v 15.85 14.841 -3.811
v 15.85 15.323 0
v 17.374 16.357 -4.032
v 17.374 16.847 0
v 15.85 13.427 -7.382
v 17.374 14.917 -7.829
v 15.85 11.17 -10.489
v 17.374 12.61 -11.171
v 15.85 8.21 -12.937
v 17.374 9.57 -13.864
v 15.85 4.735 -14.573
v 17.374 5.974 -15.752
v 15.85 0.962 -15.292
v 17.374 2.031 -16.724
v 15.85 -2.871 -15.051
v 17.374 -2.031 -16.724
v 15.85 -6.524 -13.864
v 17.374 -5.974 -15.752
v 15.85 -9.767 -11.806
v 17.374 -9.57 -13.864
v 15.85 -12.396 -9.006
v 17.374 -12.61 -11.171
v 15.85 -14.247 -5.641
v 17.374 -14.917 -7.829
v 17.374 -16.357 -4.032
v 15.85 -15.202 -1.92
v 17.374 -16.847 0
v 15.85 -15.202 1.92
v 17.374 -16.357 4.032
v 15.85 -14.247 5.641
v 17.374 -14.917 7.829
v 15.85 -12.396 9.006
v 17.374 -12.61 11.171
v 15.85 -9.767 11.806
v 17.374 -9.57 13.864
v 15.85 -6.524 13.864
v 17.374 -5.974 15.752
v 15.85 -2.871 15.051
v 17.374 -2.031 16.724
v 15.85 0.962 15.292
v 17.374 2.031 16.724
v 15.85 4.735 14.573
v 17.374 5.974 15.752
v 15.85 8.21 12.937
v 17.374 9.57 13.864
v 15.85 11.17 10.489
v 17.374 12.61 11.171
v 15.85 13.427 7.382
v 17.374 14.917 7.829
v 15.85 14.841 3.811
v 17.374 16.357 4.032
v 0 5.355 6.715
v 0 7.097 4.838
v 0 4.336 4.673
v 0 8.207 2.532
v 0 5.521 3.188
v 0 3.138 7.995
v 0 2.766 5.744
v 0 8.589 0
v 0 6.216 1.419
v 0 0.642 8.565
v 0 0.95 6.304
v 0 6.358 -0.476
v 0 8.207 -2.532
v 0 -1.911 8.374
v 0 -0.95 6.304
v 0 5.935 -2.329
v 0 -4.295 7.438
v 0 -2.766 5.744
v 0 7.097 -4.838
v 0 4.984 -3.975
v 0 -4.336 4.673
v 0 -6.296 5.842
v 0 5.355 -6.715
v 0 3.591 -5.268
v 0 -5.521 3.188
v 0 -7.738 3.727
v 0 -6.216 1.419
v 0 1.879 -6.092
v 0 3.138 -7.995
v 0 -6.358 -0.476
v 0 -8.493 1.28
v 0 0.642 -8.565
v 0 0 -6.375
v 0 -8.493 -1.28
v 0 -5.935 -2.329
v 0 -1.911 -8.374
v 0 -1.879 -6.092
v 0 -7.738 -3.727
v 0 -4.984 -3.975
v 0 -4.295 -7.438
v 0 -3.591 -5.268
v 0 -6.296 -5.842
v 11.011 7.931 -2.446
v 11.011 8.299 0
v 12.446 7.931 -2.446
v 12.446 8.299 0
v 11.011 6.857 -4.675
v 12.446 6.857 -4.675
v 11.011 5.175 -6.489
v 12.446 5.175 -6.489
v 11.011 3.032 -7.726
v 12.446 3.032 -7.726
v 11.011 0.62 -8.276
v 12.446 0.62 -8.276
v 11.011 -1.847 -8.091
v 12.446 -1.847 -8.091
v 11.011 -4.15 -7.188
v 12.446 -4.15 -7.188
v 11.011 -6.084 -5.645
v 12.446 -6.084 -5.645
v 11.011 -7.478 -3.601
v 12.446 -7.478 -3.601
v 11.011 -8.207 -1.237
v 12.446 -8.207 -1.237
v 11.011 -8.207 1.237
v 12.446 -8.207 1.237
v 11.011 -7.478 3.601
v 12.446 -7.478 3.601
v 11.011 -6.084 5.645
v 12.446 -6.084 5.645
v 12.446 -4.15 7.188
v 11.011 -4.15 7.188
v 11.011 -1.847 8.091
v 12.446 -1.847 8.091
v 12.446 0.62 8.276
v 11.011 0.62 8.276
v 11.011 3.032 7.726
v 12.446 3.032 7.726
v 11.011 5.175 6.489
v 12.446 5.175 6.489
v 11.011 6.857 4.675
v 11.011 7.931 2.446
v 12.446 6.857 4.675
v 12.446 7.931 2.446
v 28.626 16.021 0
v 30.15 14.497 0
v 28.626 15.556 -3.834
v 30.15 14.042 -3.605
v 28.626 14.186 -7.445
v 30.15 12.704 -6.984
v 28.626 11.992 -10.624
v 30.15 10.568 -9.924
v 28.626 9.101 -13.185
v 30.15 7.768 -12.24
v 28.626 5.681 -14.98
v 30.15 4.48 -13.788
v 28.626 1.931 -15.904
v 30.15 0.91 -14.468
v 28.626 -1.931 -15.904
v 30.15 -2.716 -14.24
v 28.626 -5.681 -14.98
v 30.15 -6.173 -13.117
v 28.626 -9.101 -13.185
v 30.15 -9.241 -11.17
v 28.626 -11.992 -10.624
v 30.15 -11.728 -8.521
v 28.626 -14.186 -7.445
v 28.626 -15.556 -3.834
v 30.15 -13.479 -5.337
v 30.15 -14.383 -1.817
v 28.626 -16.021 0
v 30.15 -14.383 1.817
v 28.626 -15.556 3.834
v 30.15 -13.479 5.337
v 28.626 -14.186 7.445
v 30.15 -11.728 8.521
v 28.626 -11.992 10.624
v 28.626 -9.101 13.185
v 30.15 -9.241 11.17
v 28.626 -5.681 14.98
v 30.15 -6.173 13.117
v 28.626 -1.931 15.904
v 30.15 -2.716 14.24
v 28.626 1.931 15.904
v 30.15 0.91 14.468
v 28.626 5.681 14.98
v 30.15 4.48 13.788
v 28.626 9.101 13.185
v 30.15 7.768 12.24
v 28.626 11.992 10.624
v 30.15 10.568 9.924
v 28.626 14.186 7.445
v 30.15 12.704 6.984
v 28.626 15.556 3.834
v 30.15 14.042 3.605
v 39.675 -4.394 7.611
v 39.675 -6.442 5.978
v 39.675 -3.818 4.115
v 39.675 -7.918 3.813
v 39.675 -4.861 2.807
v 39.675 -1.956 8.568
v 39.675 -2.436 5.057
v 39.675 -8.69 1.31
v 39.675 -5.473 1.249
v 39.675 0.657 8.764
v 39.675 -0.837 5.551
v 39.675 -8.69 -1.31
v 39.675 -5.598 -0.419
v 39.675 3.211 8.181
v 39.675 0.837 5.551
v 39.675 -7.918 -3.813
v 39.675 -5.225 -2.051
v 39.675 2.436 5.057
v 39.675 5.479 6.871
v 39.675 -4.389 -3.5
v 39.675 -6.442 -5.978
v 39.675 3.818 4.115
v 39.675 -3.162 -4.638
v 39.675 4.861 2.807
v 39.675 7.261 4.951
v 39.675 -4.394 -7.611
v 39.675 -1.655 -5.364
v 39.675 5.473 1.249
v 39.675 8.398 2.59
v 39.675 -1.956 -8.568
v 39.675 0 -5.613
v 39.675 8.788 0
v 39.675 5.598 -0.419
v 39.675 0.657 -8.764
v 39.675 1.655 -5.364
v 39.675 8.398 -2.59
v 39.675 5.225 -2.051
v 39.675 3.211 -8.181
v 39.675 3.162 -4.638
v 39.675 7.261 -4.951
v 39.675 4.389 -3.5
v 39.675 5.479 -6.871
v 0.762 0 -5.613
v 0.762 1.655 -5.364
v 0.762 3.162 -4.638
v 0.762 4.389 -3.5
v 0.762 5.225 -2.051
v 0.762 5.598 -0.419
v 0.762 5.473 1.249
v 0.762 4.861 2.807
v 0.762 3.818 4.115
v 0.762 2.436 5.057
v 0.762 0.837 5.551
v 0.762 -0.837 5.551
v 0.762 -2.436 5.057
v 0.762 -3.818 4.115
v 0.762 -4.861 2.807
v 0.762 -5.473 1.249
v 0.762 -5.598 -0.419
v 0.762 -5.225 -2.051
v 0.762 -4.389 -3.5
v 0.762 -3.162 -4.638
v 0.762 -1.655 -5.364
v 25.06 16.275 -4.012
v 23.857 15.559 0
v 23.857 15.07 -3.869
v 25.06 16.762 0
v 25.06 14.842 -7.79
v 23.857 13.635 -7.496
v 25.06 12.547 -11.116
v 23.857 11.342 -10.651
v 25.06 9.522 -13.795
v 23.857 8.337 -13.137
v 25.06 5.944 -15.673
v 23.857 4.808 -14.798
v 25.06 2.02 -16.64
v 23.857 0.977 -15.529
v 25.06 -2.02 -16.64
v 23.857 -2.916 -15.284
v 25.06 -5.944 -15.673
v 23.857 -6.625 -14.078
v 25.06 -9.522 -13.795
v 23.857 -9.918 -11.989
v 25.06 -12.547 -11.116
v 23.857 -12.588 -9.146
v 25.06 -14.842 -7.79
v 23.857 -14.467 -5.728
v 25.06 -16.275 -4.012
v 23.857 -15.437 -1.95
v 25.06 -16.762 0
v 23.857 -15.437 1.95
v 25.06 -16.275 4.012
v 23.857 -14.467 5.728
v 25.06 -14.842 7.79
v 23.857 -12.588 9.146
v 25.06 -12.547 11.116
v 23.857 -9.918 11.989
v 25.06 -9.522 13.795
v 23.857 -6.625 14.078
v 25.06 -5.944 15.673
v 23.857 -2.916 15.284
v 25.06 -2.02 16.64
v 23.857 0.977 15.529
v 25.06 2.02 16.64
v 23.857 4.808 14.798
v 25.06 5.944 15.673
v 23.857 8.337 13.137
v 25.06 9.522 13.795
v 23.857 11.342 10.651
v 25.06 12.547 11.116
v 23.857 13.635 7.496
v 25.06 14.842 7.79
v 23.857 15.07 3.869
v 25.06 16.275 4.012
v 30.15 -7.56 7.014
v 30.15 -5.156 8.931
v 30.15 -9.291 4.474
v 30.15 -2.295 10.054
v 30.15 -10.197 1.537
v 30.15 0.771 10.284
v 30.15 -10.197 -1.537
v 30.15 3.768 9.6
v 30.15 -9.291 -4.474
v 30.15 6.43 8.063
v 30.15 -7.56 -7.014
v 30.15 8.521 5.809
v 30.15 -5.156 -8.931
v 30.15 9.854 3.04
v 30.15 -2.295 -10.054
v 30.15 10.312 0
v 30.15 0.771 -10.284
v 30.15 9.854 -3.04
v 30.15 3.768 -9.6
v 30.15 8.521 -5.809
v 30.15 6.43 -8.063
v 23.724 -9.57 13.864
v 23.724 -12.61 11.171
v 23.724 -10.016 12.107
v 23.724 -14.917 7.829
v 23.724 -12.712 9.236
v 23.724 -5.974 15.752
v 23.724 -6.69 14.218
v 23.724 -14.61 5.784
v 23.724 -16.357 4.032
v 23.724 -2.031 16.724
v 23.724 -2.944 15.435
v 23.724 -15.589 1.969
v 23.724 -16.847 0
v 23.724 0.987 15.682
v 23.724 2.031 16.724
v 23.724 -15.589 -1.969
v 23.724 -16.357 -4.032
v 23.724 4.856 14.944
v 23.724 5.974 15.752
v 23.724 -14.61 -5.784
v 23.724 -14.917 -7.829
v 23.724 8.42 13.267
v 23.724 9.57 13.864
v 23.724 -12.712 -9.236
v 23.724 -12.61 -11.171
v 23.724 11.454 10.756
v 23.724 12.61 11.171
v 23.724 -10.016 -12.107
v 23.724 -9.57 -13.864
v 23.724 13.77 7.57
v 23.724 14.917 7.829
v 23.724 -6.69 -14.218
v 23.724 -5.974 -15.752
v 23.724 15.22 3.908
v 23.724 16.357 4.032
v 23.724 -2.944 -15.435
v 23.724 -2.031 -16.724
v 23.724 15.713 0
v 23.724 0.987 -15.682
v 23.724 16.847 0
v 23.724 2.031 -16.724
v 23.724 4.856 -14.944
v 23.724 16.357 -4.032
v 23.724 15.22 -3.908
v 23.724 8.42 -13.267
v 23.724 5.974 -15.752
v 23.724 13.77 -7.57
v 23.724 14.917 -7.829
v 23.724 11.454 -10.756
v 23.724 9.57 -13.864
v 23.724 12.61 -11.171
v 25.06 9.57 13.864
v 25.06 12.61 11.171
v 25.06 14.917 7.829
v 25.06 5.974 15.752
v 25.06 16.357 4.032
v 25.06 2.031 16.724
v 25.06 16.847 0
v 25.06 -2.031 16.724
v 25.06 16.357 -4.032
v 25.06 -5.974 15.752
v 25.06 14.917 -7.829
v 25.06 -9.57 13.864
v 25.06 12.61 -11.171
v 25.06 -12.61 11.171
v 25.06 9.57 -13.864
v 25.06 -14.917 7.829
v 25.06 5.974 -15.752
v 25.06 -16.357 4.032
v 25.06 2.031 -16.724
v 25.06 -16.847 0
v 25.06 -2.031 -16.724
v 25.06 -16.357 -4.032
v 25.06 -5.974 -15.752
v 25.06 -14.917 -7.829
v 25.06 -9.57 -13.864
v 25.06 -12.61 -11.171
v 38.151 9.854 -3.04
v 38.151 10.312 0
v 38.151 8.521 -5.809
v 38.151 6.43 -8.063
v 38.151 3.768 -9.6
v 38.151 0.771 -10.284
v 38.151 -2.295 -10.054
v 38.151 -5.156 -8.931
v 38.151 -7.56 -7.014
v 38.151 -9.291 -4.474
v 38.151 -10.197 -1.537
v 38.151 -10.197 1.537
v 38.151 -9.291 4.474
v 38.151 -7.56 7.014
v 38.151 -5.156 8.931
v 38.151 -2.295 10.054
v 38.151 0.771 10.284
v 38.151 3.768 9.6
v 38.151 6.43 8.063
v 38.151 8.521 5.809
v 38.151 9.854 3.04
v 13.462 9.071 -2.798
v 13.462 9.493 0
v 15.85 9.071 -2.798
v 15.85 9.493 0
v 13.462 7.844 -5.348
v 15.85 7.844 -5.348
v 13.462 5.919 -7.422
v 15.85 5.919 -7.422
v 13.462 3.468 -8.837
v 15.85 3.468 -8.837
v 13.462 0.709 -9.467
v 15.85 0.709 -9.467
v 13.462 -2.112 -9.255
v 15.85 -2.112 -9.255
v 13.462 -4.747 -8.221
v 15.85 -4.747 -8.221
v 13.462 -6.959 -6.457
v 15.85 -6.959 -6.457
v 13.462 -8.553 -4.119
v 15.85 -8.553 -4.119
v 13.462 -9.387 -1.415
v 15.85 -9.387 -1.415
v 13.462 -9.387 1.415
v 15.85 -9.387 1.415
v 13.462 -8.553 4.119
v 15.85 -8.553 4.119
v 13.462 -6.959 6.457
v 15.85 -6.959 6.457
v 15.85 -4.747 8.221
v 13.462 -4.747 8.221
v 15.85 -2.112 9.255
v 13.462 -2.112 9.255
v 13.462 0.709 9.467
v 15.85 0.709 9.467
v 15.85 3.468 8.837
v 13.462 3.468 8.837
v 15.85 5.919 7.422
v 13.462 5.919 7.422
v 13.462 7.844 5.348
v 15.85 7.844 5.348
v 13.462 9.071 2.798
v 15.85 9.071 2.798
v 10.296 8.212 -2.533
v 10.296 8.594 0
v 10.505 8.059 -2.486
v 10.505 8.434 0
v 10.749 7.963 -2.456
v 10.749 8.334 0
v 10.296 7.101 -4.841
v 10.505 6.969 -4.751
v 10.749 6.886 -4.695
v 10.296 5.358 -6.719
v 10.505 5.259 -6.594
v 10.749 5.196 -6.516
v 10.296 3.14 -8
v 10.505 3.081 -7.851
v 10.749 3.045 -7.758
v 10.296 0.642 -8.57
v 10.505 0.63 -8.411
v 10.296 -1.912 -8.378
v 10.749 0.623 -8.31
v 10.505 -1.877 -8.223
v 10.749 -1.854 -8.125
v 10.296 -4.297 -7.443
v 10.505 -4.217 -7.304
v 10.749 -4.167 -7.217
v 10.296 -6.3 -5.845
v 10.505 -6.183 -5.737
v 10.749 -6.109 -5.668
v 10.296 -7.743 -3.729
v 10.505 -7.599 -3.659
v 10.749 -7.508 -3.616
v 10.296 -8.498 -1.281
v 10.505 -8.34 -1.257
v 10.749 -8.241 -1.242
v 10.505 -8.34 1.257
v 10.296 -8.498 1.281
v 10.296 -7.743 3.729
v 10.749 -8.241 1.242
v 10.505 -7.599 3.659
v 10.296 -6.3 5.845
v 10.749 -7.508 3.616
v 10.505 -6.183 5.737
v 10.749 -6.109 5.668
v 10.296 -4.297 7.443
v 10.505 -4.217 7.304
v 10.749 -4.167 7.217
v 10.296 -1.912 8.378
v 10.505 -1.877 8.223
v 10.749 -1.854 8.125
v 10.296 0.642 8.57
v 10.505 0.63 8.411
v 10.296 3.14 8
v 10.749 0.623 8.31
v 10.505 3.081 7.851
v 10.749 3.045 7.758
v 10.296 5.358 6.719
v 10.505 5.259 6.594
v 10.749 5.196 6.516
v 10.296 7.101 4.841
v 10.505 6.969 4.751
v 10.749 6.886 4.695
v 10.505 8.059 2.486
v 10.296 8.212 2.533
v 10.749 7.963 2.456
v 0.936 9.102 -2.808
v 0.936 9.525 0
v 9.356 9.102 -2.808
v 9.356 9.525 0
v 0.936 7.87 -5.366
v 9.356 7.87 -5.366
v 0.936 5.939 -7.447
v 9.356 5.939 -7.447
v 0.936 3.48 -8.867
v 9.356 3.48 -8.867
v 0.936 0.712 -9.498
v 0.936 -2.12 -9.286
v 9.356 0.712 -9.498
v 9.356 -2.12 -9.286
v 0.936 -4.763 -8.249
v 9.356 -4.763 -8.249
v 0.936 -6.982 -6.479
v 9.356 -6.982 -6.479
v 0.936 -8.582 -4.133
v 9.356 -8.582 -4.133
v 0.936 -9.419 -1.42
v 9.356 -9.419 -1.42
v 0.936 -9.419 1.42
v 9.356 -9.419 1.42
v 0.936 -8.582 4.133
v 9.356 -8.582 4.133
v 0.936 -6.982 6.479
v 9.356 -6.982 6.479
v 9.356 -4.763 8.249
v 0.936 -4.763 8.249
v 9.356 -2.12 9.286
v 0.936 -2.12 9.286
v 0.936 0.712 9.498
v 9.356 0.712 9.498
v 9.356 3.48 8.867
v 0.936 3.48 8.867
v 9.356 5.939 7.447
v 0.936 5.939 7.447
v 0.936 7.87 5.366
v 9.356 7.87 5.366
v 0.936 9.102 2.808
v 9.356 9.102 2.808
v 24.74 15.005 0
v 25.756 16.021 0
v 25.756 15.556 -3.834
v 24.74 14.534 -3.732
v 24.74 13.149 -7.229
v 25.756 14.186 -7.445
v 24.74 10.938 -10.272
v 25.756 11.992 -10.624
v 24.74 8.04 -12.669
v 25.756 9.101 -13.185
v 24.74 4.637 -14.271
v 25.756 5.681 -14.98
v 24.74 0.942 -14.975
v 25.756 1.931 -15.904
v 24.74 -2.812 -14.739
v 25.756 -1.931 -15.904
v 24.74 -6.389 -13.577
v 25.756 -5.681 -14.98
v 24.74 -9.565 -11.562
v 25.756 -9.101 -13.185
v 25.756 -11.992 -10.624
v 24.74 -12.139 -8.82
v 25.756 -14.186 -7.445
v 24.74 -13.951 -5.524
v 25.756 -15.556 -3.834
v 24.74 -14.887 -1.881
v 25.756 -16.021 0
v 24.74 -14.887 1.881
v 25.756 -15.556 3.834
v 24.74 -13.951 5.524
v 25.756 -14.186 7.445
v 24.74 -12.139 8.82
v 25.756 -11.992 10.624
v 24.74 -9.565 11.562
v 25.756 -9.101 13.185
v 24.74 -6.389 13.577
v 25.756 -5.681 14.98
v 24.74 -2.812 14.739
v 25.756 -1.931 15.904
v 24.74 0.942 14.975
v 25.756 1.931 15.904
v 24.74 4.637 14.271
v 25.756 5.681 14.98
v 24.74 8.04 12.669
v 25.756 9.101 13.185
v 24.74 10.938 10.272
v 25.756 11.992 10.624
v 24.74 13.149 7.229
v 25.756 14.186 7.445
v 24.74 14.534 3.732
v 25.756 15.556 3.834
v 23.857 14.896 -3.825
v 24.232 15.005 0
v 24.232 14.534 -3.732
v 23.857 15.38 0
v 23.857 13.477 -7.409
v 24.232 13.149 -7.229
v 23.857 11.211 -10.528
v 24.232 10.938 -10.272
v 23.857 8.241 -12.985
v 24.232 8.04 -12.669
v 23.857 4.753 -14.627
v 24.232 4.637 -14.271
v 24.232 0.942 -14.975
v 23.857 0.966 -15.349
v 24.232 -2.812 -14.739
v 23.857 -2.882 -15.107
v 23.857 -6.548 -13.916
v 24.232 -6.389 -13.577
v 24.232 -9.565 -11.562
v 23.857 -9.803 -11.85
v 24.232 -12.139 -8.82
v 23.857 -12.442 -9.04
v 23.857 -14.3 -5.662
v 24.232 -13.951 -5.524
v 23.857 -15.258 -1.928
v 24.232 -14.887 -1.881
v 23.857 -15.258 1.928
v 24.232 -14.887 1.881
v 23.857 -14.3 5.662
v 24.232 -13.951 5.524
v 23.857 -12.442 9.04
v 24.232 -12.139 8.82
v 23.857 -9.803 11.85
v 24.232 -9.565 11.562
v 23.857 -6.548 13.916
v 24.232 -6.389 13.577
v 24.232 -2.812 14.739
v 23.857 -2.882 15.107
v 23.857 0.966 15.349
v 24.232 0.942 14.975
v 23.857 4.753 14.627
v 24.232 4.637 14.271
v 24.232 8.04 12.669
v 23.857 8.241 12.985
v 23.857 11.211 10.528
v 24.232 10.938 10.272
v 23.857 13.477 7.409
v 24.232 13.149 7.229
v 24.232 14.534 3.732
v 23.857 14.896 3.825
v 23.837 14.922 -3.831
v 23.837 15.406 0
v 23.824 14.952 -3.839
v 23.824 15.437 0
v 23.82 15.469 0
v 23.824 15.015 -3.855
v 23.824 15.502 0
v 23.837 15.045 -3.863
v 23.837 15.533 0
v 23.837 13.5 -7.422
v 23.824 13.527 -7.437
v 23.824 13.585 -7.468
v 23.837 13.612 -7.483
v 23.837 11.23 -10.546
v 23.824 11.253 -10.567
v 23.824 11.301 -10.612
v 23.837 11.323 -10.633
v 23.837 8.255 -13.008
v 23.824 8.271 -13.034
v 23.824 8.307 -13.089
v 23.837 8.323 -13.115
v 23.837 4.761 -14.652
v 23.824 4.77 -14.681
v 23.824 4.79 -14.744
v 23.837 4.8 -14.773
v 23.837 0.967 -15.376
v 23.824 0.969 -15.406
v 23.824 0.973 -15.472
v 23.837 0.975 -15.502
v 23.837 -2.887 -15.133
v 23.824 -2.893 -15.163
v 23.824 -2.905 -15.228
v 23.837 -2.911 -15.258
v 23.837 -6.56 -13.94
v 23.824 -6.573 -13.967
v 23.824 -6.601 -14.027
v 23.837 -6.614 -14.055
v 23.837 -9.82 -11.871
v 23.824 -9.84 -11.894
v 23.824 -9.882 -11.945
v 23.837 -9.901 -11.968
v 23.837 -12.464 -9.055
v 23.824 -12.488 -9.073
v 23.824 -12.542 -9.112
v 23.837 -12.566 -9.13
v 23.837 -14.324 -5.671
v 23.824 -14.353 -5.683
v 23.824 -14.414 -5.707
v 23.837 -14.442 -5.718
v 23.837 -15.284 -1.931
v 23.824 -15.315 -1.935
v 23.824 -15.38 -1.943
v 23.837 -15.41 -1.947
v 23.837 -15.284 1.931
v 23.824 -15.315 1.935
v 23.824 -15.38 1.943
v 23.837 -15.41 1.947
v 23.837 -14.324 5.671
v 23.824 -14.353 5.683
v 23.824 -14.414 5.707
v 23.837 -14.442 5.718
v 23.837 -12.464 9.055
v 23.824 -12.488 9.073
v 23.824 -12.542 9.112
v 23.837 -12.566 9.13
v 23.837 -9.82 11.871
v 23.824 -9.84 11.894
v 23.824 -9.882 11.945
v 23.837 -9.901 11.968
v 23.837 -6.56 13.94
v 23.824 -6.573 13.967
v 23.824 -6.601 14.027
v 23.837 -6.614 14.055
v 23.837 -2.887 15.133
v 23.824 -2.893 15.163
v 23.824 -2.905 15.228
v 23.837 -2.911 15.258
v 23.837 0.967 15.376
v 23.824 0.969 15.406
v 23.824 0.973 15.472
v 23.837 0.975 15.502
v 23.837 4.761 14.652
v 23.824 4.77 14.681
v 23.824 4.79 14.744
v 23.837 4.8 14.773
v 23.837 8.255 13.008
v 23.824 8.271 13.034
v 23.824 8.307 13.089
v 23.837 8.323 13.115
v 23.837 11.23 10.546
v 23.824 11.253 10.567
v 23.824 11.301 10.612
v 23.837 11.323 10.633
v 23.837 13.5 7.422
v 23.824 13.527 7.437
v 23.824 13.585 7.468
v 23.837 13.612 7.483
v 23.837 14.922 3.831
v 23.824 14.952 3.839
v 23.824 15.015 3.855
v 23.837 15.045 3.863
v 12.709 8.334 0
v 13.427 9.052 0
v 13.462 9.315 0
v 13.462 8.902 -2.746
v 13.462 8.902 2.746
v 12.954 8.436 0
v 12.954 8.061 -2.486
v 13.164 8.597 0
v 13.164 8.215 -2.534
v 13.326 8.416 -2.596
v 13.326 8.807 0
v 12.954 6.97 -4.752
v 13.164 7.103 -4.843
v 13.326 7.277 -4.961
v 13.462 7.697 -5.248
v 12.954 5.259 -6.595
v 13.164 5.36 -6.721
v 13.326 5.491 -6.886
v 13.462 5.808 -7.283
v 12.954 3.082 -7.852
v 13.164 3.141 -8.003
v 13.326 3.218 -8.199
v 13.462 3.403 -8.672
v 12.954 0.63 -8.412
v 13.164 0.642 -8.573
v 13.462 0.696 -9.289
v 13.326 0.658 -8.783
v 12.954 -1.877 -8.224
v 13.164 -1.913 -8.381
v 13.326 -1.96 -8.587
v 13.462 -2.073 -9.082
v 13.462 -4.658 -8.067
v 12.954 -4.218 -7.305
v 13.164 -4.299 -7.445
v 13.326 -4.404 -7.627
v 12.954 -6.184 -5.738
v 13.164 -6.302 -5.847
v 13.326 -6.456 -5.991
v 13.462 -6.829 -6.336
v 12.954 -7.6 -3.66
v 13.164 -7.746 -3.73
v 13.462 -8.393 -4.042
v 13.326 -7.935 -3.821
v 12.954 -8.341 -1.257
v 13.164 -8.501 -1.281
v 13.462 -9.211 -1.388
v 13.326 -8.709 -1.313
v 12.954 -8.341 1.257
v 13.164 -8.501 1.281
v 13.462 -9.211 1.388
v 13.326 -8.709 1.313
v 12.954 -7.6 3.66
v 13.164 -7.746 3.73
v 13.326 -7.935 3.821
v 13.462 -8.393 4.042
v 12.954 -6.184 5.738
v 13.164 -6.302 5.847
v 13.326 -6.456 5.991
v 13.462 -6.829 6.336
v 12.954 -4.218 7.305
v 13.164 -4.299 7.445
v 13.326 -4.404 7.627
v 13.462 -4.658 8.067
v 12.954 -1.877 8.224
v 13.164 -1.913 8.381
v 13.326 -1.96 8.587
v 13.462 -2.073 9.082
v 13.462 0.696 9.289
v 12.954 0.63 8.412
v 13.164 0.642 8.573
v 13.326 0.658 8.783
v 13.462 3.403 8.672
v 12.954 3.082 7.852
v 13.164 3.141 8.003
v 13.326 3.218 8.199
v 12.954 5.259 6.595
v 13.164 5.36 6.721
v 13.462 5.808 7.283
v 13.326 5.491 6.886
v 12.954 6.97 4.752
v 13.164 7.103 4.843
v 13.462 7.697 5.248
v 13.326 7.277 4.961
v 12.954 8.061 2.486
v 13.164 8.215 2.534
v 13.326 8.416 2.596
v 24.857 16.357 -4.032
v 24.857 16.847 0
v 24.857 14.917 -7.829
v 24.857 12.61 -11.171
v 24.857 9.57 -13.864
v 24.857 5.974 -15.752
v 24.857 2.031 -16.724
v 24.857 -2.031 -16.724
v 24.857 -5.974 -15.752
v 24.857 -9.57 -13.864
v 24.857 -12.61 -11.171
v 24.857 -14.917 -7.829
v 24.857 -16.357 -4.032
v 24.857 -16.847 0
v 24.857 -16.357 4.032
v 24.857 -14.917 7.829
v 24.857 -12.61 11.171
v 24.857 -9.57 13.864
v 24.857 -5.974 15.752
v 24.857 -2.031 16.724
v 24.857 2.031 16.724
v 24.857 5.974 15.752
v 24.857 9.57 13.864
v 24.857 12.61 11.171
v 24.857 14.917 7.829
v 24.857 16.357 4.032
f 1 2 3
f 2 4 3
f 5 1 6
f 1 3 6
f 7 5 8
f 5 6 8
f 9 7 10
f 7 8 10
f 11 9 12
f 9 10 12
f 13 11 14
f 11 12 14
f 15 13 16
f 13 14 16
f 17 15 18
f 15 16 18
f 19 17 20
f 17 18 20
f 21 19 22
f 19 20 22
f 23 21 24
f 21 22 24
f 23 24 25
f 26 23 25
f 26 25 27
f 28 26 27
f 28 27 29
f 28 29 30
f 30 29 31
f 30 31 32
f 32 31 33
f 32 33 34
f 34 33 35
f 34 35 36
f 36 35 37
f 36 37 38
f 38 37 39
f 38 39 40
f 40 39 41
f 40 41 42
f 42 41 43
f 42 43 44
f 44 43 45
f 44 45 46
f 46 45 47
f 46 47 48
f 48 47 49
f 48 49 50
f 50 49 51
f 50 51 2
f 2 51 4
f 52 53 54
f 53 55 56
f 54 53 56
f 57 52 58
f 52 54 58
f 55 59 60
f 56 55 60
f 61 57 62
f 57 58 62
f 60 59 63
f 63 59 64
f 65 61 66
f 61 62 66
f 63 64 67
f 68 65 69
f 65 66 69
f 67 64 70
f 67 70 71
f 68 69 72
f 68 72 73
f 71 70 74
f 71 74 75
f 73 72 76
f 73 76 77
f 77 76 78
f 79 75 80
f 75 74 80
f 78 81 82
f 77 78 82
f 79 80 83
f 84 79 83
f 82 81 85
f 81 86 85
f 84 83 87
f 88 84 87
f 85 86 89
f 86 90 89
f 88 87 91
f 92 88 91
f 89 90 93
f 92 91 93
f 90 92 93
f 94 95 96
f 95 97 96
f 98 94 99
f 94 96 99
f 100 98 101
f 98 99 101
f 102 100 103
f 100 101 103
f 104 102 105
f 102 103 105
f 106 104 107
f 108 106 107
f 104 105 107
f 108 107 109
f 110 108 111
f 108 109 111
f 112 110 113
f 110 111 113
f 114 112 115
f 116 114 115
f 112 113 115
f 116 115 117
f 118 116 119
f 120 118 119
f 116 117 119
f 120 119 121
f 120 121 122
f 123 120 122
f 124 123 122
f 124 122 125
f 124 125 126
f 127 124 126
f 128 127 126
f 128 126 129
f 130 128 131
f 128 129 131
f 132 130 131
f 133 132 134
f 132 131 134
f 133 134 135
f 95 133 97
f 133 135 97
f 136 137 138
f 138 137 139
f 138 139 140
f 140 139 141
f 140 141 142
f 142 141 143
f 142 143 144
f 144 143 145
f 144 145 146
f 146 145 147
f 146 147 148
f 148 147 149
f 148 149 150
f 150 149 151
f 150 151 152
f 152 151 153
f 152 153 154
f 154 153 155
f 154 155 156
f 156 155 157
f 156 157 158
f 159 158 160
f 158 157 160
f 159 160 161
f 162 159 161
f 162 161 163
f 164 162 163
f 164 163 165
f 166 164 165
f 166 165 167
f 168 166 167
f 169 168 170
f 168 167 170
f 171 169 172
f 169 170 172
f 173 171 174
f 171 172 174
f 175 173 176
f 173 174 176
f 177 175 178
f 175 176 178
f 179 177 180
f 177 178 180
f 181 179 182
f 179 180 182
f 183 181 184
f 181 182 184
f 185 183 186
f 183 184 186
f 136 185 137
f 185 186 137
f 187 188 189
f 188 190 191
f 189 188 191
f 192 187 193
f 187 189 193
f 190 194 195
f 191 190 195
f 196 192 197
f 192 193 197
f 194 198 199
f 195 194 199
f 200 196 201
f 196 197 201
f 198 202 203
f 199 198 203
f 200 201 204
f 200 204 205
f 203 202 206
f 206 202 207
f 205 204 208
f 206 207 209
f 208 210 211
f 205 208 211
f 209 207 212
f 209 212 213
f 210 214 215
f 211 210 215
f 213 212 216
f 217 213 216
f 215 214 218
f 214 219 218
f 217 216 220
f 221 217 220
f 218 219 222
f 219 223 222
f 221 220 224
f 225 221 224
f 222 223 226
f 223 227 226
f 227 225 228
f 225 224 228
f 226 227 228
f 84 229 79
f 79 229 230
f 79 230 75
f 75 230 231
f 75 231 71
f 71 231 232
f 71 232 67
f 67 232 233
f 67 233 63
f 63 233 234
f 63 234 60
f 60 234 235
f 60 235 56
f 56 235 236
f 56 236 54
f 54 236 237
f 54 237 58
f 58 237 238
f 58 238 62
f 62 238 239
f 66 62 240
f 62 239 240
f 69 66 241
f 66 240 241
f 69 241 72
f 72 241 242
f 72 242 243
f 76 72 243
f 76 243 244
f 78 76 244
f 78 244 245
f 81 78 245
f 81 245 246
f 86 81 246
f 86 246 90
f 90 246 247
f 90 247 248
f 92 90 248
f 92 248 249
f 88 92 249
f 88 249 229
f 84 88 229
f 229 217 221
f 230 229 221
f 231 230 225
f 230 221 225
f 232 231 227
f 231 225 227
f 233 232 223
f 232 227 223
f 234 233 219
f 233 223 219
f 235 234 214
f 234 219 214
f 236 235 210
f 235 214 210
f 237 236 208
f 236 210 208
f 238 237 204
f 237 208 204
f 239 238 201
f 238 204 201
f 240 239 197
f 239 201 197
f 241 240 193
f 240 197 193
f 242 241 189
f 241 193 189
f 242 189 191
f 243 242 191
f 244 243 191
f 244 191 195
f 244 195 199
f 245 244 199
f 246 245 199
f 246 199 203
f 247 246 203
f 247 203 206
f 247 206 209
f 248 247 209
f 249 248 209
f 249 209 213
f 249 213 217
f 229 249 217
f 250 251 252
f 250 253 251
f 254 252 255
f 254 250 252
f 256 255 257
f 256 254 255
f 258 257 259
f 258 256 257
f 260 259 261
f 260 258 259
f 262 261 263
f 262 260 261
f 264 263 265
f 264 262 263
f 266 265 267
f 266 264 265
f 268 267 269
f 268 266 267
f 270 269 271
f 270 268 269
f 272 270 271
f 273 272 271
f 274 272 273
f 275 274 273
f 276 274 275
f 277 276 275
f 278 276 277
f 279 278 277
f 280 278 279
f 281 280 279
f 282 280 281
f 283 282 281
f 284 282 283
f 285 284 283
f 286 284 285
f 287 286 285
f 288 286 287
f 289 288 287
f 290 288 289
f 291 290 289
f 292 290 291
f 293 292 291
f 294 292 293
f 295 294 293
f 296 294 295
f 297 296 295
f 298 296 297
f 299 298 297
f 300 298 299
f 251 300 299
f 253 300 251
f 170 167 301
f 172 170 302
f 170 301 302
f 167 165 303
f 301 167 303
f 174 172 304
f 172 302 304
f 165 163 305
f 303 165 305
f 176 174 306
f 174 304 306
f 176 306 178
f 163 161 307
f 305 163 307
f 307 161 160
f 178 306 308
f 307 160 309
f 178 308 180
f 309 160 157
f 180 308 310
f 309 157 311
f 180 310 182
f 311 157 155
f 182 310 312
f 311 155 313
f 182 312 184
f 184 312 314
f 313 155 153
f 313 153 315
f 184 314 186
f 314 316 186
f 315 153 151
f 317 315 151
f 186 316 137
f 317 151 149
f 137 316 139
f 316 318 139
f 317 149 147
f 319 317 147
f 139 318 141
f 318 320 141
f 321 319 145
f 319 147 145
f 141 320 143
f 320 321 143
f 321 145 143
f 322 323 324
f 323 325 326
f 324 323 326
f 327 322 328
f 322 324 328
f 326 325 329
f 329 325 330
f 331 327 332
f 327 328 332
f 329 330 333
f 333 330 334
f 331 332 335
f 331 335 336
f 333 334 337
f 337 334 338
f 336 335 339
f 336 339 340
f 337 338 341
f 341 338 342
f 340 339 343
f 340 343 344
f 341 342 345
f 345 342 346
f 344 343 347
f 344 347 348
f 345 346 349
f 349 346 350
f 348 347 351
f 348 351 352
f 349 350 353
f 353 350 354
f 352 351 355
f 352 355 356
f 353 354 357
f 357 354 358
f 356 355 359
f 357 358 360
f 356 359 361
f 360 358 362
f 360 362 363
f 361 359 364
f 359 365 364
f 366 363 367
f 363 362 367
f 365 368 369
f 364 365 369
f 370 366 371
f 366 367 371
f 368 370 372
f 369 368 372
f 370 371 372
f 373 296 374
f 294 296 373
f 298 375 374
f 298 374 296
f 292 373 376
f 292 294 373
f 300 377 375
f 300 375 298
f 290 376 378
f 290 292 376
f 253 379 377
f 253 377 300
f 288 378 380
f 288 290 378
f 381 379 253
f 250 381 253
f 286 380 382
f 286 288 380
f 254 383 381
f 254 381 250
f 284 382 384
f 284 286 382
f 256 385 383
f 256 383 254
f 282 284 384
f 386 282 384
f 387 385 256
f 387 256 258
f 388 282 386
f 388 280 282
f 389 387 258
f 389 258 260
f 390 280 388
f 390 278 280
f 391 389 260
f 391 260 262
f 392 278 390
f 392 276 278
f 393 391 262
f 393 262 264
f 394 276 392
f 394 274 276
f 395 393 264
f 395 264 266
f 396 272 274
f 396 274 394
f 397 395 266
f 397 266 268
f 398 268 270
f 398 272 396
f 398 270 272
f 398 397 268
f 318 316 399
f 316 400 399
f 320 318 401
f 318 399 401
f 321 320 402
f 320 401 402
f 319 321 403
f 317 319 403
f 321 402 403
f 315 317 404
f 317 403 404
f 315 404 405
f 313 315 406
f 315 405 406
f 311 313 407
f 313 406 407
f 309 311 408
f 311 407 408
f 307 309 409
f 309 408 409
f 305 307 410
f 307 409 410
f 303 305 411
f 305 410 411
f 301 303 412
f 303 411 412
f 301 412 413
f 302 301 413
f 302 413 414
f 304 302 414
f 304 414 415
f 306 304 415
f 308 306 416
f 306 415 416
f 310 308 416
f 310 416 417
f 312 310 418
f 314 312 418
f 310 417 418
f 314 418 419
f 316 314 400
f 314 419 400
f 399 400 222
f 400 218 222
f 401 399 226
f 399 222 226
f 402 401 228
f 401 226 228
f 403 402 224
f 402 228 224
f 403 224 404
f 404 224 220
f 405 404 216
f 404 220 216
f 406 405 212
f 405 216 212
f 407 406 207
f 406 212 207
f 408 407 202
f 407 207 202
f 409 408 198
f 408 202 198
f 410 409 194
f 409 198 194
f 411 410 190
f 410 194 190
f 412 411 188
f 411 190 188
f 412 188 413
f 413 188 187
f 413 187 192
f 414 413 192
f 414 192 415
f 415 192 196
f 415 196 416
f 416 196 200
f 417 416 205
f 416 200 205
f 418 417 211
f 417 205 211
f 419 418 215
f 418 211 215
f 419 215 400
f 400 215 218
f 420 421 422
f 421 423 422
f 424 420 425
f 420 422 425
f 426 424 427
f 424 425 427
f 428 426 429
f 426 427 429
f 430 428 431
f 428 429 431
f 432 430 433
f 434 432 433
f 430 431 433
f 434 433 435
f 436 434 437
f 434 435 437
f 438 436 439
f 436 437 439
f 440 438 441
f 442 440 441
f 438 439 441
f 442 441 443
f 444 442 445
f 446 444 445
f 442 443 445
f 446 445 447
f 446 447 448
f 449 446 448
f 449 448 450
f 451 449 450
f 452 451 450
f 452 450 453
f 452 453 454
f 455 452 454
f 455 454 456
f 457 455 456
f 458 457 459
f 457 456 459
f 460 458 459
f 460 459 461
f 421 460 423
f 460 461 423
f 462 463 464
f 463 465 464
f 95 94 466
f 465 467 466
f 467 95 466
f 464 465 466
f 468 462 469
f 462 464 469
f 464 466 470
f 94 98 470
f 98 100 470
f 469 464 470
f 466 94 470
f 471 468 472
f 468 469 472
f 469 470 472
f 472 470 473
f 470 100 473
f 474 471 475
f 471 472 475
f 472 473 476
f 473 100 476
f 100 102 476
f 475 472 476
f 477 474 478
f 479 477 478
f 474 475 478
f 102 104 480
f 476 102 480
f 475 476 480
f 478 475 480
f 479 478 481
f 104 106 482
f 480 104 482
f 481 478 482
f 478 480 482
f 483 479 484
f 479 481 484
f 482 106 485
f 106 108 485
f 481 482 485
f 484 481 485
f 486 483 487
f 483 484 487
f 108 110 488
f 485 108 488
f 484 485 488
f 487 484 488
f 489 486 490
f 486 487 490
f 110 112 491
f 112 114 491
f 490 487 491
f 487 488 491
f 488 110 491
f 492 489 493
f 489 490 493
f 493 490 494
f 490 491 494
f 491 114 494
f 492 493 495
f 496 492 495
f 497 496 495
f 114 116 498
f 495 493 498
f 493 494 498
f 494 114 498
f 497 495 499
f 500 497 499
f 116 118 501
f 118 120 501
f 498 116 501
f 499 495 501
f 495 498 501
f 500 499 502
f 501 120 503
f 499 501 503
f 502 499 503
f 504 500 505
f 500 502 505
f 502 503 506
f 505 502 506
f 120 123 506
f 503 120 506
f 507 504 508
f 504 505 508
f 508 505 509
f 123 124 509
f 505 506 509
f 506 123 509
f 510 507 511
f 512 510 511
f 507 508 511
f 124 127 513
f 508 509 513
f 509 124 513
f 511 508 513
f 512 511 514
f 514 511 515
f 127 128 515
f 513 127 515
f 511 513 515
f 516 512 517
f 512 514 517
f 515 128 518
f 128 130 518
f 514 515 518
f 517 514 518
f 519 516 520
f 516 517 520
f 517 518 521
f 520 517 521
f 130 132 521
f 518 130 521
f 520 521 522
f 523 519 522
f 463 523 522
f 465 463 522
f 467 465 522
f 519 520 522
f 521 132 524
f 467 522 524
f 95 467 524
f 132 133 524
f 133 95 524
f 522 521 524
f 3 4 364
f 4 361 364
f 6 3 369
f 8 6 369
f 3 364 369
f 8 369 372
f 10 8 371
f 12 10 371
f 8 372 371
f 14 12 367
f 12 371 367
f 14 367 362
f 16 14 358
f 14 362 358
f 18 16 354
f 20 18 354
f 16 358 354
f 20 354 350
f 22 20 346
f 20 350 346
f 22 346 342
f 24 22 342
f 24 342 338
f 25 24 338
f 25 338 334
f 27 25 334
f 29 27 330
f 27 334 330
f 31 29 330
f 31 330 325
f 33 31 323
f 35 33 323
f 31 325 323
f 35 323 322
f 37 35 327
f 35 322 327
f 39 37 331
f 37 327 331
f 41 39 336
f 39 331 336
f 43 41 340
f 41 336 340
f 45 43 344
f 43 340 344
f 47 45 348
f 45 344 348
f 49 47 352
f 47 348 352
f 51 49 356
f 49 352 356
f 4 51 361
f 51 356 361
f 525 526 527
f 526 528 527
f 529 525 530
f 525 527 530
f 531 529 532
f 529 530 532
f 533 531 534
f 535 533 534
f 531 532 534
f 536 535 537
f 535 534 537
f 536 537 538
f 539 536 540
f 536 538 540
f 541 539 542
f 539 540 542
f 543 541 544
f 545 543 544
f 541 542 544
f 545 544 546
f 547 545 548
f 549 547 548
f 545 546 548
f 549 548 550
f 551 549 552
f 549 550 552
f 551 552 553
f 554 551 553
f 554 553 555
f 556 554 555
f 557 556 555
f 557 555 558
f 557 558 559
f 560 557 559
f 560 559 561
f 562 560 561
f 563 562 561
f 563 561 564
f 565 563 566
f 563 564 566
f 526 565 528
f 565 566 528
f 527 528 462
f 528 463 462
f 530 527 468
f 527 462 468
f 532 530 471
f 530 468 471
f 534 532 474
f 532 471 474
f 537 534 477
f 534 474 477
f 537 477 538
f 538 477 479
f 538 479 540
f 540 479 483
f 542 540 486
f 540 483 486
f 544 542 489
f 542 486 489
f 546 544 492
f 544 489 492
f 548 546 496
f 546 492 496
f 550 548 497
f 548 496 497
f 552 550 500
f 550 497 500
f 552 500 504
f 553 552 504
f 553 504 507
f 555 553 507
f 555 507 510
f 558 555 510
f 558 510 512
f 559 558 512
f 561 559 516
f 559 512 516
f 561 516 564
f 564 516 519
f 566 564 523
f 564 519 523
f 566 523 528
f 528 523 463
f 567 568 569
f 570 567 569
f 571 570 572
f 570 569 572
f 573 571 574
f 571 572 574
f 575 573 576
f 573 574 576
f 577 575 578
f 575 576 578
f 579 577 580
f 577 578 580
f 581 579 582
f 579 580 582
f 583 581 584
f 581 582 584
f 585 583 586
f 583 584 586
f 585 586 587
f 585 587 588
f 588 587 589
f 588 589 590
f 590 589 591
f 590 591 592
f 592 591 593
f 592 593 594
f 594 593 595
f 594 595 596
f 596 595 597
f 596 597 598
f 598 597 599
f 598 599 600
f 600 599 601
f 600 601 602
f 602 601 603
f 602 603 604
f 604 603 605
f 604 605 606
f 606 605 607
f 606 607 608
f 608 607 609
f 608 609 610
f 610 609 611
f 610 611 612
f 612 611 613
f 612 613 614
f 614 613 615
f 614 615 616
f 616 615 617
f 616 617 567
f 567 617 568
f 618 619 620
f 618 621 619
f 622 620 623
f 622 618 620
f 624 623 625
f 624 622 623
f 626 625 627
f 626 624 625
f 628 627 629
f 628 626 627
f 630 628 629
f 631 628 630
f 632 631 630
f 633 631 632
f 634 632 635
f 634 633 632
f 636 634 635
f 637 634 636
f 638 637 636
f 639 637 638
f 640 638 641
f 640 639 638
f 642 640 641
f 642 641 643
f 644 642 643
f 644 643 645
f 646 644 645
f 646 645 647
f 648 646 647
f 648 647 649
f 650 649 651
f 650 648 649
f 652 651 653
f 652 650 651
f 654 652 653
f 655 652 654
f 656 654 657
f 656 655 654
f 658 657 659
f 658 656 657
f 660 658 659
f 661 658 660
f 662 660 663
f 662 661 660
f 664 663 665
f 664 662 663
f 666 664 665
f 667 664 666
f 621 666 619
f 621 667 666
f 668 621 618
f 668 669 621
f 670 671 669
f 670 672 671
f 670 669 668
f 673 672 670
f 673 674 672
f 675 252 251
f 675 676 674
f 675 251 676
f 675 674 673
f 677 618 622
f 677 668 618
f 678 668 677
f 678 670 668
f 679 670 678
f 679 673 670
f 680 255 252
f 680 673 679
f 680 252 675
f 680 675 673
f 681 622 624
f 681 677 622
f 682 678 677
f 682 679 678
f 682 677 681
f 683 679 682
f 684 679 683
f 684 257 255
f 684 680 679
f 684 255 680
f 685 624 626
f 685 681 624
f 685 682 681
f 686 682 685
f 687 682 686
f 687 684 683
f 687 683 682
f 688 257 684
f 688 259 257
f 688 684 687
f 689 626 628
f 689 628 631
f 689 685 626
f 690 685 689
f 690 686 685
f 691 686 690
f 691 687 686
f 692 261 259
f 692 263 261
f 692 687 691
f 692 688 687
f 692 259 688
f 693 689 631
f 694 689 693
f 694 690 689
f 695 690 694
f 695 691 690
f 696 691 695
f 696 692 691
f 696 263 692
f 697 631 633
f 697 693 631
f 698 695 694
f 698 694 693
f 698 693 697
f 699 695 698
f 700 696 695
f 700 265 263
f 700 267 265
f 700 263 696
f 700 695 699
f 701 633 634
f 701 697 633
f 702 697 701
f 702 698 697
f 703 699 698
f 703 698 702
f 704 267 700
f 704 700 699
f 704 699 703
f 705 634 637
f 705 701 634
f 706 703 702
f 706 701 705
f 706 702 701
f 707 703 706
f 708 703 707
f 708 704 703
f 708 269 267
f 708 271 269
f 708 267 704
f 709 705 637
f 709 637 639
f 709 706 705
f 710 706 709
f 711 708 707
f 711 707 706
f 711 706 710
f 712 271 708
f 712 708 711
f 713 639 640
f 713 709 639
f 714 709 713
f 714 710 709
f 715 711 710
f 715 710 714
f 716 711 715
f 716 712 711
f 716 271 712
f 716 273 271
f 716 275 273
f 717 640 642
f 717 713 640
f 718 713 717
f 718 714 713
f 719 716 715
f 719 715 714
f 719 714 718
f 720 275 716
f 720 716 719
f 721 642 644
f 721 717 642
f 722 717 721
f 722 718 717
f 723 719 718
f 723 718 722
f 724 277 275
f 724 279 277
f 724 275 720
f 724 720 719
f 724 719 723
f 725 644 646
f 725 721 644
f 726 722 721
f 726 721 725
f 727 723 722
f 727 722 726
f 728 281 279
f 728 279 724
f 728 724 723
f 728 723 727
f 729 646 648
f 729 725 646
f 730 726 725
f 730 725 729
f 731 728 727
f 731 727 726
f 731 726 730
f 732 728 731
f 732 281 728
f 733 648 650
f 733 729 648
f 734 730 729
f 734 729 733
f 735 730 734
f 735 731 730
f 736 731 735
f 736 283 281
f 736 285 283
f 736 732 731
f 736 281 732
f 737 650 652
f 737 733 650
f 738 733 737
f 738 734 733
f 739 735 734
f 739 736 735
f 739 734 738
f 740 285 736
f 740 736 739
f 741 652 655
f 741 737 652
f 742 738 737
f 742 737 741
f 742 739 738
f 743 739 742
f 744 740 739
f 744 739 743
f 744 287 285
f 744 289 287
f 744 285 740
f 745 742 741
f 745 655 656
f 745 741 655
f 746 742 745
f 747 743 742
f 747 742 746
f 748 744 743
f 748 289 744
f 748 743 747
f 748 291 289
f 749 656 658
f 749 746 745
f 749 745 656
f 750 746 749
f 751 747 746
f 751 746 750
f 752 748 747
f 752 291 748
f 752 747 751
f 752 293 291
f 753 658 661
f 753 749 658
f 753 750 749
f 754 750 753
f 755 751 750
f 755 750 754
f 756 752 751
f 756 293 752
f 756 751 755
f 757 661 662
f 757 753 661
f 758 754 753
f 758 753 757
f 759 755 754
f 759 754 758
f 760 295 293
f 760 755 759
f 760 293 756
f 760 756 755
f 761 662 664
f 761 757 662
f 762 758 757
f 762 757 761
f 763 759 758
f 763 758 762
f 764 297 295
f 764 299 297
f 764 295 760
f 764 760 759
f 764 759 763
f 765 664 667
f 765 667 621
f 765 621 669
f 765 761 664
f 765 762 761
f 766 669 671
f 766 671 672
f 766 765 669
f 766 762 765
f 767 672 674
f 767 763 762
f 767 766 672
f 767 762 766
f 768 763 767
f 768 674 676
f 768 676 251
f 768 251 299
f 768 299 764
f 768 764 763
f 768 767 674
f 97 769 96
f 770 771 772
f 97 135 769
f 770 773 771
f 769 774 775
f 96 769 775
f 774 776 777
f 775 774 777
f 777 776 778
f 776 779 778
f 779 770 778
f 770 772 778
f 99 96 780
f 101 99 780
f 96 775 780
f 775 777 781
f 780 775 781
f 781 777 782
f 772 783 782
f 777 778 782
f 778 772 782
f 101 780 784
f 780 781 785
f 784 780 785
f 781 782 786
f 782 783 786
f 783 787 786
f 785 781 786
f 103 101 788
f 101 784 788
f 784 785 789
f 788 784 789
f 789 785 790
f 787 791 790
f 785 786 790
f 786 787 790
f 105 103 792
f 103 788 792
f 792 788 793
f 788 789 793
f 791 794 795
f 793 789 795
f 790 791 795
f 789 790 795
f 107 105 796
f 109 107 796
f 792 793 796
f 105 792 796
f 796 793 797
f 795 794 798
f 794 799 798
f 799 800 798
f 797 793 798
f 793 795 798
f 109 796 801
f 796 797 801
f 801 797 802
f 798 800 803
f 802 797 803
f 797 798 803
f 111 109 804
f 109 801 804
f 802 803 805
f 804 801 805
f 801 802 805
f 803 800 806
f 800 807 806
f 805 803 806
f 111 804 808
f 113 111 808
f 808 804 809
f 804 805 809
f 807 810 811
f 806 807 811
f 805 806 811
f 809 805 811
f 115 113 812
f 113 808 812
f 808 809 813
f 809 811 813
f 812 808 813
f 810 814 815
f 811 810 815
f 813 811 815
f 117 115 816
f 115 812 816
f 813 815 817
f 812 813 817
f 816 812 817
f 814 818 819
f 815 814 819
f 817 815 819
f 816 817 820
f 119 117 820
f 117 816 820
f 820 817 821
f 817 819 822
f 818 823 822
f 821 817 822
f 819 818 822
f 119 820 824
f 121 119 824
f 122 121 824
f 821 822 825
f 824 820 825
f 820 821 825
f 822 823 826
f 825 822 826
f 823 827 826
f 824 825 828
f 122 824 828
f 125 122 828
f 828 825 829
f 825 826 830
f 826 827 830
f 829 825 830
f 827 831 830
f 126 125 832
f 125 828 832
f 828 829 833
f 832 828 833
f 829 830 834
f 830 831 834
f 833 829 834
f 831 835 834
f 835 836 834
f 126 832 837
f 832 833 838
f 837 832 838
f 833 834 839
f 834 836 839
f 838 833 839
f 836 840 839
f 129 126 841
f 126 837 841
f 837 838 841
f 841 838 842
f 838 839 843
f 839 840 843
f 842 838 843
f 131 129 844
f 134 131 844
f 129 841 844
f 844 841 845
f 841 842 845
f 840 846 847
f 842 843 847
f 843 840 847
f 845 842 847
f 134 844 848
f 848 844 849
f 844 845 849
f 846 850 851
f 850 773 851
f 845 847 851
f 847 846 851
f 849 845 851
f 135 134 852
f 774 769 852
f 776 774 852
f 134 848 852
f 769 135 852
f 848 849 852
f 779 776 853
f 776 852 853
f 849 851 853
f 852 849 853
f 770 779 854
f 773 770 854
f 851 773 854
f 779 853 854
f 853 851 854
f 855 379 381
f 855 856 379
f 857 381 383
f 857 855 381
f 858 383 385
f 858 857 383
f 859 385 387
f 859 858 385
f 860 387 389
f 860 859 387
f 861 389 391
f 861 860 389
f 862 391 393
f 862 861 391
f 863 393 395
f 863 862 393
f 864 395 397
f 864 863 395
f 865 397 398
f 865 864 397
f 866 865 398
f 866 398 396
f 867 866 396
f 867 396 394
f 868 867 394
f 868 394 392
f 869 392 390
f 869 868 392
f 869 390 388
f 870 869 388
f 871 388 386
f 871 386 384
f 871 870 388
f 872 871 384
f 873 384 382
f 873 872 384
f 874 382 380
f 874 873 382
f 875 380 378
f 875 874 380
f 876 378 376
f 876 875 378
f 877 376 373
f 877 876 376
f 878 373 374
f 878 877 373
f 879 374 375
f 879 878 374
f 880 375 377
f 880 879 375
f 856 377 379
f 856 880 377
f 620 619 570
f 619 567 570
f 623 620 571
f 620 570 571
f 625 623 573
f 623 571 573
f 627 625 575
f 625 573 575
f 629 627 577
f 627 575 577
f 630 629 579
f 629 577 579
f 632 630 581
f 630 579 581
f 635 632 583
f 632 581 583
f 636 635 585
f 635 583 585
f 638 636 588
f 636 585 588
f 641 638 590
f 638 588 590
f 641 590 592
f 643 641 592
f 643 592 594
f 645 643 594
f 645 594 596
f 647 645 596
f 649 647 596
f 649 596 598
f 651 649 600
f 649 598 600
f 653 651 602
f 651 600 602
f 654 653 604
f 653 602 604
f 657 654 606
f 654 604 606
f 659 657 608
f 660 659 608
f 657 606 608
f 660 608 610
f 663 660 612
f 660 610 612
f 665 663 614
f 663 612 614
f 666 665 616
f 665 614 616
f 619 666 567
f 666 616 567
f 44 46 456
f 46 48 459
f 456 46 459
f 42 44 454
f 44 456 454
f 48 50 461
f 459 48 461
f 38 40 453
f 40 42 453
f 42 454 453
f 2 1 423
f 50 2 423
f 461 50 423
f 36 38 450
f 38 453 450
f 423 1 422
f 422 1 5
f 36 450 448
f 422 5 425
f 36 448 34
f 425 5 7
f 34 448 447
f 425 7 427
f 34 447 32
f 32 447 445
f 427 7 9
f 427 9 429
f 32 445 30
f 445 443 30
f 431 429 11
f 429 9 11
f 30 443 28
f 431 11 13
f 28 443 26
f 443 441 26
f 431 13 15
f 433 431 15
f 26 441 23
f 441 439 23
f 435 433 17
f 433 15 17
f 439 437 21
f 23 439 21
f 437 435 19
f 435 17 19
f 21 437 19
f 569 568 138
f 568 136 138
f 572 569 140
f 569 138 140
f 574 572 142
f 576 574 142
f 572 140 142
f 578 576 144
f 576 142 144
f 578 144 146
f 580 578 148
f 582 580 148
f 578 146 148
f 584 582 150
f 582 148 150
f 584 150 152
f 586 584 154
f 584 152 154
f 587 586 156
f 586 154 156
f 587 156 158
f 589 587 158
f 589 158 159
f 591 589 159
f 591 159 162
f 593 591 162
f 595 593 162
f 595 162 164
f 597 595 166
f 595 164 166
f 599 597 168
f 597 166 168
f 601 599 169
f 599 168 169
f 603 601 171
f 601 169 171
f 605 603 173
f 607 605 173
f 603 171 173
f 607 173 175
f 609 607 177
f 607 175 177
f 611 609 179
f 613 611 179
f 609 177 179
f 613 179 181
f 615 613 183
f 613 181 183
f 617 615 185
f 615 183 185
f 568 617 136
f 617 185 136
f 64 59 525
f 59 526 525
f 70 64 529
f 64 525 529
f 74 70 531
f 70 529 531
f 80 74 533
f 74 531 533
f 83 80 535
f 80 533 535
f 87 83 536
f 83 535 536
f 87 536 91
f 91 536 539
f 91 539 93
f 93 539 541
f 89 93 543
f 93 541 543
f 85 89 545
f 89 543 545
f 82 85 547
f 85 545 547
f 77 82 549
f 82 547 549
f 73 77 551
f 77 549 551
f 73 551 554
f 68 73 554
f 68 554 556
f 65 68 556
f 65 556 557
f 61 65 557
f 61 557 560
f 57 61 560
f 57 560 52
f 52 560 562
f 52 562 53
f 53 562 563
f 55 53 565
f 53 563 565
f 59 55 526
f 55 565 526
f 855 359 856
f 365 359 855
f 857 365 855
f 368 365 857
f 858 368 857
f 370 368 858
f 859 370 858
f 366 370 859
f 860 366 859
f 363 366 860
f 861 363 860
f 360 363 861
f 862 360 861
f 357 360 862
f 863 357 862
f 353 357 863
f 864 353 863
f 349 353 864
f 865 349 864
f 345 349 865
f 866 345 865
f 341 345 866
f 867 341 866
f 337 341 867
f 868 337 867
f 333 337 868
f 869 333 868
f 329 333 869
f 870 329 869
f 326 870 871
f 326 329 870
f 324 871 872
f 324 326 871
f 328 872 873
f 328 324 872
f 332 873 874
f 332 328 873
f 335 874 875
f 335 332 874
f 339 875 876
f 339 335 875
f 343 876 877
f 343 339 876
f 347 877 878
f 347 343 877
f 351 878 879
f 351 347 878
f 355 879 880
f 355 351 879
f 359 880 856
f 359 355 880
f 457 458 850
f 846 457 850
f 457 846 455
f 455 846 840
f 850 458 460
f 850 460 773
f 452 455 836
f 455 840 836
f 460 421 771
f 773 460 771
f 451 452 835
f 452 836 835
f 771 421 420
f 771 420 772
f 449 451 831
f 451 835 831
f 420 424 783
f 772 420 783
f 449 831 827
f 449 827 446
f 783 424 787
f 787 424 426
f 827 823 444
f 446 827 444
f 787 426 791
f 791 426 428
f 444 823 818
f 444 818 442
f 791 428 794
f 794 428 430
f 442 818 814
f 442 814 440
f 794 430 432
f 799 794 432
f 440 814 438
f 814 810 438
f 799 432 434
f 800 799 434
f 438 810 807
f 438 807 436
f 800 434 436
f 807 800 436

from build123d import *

# Parameters (mm, degrees)
HOLE1_D           = 11.2268
HOLE1_CSINK_D     = 12.7508
HOLE1_CSINK_ANGLE = 90


with BuildPart() as part:
    # Sketch1 → Revolve1 (revolve)
    with BuildSketch(Plane.XY):
        with BuildLine():
            Line((0, 0), (0, 8.58901))
            Line((0, 8.58901), (0.93599, 9.525))
            Line((0.93599, 9.525), (9.35648951, 9.525))
            Line((9.35648951, 9.525), (10.295571935, 8.59395034))
            ThreePointArc((10.295571935, 8.59395034), (10.624110429, 8.375955547), (11.0109, 8.29945))
            Line((11.0109, 8.29945), (12.446, 8.29945))
            ThreePointArc((12.446, 8.29945), (13.16442049, 8.59702951), (13.462, 9.31545))
            Line((13.462, 9.31545), (13.462, 9.49325))
            Line((13.462, 9.49325), (15.8496, 9.49325))
            Line((15.8496, 9.49325), (15.8496, 0))
            Line((15.8496, 0), (0, 0))
        make_face()
    revolve(axis=Axis((15.8496, 0, 0), (-1, 0, 0)))

    # Sketch2 → Revolve2 (revolve)
    with BuildSketch(Plane.XY):
        Polygon((15.8496, 0), (15.8496, 15.32255), (17.3736, 16.84655), (23.7236, 16.84655), (23.7236, 15.00505), (24.7396, 15.00505), (25.7556, 16.02105), (28.6258, 16.02105), (30.1498, 14.49705), (30.1498, 0), align=None)
    revolve(axis=Axis((30.1498, 0, 0), (-1, 0, 0)))

    # Sketch3 → Revolve3 (revolve)
    with BuildSketch(Plane.XY):
        Polygon((30.1498, 0), (30.1498, 10.3124), (38.1508, 10.3124), (39.6748, 8.7884), (39.6748, 0), align=None)
    revolve(axis=Axis((39.6748, 0, 0), (-1, 0, 0)))

    # Hole1 (through all)
    with Locations(Plane.ZY):
        with Locations((0, 0)):
            CounterSinkHole(HOLE1_D / 2, HOLE1_CSINK_D / 2, counter_sink_angle=HOLE1_CSINK_ANGLE)

    # Sketch6 → Revolve4 (revolve)
    with BuildSketch(Plane.XY):
        with BuildLine():
            Line((23.7236, 14.75105), (24.7396, 14.75105))
            Line((24.7396, 14.75105), (24.7396, 15.00505))
            Line((24.7396, 15.00505), (24.2316, 15.00505))
            Line((24.2316, 15.00505), (23.856982072, 15.379667928))
            ThreePointArc((23.856982072, 15.379667928), (23.819784633, 15.46947049), (23.856982072, 15.559273051))
            Line((23.856982072, 15.559273051), (25.060090825, 16.762381804))
            Line((25.060090825, 16.762381804), (25.060090825, 16.84655))
            Line((25.060090825, 16.84655), (24.856890825, 16.84655))
            Line((24.856890825, 16.84655), (23.7236, 15.713259175))
            Line((23.7236, 15.713259175), (23.7236, 14.75105))
        make_face()
    revolve(axis=Axis((24.7396, 0, 0), (-1, 0, 0)))


solid = part.part
